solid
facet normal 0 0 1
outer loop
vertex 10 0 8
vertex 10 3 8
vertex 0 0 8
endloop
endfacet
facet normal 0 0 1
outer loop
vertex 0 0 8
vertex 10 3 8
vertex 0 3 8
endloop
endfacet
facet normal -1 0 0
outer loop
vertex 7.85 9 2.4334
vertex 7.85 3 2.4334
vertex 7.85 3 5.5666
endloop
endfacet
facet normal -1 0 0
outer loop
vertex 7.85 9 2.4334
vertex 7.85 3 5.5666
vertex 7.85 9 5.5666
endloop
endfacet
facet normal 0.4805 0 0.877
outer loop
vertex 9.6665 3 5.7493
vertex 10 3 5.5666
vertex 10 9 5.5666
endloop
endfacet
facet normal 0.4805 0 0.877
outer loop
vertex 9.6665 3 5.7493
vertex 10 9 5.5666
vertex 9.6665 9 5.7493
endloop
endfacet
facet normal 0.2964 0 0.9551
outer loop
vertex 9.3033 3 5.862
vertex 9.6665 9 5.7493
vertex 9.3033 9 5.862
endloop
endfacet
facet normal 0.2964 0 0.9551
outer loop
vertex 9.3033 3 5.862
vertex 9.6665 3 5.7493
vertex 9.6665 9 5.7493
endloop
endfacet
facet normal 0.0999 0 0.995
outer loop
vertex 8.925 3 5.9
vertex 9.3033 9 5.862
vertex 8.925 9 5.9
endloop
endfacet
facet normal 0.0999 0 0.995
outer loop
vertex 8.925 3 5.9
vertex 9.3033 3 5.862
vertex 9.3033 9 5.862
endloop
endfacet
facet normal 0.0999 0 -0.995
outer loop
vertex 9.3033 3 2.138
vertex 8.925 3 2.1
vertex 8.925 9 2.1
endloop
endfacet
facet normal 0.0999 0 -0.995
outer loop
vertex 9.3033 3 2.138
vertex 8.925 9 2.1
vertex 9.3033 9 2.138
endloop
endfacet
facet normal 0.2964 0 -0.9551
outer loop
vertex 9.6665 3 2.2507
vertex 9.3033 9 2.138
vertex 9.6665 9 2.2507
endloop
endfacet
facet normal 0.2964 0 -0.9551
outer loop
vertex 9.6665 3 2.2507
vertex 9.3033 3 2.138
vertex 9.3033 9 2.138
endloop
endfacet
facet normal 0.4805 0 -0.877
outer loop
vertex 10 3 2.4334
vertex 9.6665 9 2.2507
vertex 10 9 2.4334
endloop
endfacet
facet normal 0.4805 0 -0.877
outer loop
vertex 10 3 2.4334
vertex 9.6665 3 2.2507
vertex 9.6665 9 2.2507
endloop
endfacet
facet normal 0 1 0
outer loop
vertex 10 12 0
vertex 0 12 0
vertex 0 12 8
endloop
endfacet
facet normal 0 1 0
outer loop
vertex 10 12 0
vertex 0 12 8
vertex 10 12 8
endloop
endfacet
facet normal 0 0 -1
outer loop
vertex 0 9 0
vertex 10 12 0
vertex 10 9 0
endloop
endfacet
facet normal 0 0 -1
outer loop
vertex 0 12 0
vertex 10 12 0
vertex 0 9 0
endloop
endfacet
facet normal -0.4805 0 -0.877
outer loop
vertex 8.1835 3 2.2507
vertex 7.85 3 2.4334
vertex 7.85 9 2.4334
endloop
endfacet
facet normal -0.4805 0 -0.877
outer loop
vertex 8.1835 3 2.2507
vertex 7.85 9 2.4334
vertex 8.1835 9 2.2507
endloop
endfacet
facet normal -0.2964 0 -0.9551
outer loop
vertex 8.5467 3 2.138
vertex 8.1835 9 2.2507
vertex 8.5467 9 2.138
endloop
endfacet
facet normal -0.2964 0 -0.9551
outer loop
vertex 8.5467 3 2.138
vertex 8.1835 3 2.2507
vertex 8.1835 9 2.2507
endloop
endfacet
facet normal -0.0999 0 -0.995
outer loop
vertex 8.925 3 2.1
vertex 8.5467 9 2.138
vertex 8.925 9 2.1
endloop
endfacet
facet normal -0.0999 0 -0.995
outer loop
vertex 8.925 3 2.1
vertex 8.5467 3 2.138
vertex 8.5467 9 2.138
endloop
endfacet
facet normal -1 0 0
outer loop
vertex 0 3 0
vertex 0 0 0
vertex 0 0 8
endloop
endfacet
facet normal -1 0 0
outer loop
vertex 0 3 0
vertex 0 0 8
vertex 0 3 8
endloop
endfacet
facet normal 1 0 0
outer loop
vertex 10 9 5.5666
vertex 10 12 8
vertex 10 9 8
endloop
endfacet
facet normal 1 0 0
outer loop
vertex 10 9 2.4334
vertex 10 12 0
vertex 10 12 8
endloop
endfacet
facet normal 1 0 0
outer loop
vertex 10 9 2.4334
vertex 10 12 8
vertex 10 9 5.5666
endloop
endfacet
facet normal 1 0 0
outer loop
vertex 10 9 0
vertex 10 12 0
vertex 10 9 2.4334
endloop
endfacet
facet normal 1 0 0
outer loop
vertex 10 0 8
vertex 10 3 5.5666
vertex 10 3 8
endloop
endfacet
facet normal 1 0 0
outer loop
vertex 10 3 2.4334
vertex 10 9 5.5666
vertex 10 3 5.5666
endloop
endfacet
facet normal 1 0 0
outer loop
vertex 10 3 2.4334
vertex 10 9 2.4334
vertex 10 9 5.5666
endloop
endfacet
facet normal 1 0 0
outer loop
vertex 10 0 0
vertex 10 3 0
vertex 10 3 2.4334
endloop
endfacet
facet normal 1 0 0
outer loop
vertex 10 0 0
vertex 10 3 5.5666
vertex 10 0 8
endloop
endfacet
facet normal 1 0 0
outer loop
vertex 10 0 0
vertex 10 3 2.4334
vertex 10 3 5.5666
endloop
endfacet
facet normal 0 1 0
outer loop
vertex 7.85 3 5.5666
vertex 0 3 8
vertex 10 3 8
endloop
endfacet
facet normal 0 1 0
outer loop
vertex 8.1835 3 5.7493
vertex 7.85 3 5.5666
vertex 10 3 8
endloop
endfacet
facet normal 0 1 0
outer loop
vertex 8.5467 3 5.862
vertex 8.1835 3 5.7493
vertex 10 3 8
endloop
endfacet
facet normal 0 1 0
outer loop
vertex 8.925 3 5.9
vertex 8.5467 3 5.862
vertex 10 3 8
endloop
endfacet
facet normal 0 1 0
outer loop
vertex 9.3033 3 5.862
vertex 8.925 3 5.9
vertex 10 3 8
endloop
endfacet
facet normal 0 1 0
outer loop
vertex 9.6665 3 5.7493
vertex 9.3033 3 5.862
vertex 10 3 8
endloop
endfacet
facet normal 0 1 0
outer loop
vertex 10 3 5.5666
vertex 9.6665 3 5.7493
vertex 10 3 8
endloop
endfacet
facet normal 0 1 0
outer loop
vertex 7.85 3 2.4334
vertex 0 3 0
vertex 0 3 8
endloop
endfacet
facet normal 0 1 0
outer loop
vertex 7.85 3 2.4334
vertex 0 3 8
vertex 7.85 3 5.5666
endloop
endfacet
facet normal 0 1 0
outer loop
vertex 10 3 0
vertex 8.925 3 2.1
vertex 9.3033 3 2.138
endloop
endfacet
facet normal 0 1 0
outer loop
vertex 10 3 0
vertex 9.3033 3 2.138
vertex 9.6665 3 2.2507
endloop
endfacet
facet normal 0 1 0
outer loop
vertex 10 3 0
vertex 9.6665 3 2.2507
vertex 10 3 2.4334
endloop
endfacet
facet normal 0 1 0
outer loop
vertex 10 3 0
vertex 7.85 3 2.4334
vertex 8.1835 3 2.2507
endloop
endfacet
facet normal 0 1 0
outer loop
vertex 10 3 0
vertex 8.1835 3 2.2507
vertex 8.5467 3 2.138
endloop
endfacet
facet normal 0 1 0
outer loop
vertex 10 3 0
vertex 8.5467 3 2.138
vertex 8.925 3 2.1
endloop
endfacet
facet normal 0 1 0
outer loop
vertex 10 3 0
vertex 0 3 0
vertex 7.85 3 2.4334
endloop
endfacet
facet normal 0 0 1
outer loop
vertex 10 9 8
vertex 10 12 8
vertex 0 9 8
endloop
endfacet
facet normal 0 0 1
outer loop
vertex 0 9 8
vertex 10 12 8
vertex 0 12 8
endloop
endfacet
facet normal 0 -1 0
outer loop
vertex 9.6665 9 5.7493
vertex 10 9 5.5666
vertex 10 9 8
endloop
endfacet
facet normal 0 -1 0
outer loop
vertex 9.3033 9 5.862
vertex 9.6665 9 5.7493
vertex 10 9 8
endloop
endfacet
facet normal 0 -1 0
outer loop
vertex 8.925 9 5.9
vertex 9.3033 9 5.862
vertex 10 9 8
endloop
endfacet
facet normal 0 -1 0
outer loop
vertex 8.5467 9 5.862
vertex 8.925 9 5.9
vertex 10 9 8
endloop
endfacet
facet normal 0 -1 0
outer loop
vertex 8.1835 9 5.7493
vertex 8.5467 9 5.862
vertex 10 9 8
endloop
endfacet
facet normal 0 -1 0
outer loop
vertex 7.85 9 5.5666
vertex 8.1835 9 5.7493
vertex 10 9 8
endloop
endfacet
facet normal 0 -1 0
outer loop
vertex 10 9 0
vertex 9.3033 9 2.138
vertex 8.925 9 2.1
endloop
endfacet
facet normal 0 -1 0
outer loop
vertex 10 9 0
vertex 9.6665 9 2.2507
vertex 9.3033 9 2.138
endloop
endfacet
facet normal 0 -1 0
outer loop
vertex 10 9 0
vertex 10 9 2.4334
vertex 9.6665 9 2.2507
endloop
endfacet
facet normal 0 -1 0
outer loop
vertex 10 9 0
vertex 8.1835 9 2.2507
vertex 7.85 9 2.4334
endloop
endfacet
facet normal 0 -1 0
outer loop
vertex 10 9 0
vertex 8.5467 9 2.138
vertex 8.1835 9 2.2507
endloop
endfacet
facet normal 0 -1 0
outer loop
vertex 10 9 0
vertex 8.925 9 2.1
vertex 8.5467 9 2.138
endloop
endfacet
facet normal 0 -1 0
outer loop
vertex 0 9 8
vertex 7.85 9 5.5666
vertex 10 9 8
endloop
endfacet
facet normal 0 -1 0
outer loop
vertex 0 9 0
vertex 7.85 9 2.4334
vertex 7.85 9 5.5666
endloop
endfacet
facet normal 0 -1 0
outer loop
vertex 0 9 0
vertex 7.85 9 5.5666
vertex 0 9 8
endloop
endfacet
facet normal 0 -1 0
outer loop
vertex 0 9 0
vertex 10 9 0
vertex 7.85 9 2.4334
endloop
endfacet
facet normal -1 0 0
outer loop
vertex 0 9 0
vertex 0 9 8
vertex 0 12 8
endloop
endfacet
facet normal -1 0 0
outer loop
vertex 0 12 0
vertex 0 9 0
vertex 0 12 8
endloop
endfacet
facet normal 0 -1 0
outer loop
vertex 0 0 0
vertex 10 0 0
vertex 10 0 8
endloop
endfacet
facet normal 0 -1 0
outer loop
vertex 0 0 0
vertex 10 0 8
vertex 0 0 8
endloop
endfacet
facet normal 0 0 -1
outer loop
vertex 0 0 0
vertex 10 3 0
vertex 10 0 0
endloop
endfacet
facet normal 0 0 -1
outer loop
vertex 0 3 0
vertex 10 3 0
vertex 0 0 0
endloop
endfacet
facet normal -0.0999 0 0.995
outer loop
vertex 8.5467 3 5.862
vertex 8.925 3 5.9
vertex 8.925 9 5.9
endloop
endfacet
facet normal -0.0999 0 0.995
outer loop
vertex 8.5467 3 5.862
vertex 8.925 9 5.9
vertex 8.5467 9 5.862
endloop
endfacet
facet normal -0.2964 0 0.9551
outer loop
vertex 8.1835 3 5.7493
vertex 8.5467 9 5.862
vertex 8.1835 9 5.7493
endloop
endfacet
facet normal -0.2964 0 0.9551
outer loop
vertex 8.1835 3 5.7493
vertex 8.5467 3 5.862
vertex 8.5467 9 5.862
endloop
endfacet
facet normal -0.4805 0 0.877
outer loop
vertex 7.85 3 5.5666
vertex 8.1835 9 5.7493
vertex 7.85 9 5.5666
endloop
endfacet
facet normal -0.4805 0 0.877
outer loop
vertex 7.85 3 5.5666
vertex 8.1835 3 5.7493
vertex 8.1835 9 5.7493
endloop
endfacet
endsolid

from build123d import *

# Parameters (mm, degrees)
BOSS_EXTRUDE1_DEPTH = 8
SKETCH2_W           = 2.1
SKETCH2_H           = 6
CUT_EXTRUDE1_DEPTH  = 8
CUT_EXTRUDE2_DEPTH  = 6


with BuildPart() as part:
    # Sketch1 → Boss-Extrude1 (new body)
    with BuildSketch(Plane.XY):
        Polygon((0, 9), (0, 12), (10, 12), (10, 0), (0, 0), (0, 3), (7.85, 3), (7.85, 9), align=None)
    extrude(amount=BOSS_EXTRUDE1_DEPTH)

    # Sketch2 → Cut-Extrude1 (cut)
    with BuildSketch(Plane(origin=(10, 0, 0), x_dir=(0, 0, -1), z_dir=(1, 0, 0))):
        with Locations((-6.95, 6)):
            Rectangle(SKETCH2_W, SKETCH2_H)
        with Locations((-1.05, 6)):
            Rectangle(SKETCH2_W, SKETCH2_H)
    extrude(amount=-CUT_EXTRUDE1_DEPTH, mode=Mode.SUBTRACT)

    # Sketch3 → Cut-Extrude2 (cut)
    with BuildSketch(Plane(origin=(0, 3, 0), x_dir=(1, 0, 0), z_dir=(0, 1, 0))):
        with BuildLine():
            Line((10, -2.1), (8.925, -2.1))
            ThreePointArc((8.925, -2.1), (9.487750142, -2.185251456), (10, -2.433355497))
            Line((10, -2.433355497), (10, -2.1))
        make_face()
        with BuildLine():
            Line((8.925, -2.1), (7.85, -2.1))
            Line((7.85, -2.1), (7.85, -2.433355497))
            ThreePointArc((7.85, -2.433355497), (8.362249858, -2.185251456), (8.925, -2.1))
        make_face()
        with BuildLine():
            Line((7.85, -5.566644503), (7.85, -5.9))
            Line((7.85, -5.9), (8.925, -5.9))
            ThreePointArc((8.925, -5.9), (8.362249858, -5.814748544), (7.85, -5.566644503))
        make_face()
        with BuildLine():
            ThreePointArc((10, -5.566644503), (9.487750142, -5.814748544), (8.925, -5.9))
            Line((8.925, -5.9), (10, -5.9))
            Line((10, -5.9), (10, -5.566644503))
        make_face()
    extrude(amount=CUT_EXTRUDE2_DEPTH, mode=Mode.SUBTRACT)


solid = part.part
